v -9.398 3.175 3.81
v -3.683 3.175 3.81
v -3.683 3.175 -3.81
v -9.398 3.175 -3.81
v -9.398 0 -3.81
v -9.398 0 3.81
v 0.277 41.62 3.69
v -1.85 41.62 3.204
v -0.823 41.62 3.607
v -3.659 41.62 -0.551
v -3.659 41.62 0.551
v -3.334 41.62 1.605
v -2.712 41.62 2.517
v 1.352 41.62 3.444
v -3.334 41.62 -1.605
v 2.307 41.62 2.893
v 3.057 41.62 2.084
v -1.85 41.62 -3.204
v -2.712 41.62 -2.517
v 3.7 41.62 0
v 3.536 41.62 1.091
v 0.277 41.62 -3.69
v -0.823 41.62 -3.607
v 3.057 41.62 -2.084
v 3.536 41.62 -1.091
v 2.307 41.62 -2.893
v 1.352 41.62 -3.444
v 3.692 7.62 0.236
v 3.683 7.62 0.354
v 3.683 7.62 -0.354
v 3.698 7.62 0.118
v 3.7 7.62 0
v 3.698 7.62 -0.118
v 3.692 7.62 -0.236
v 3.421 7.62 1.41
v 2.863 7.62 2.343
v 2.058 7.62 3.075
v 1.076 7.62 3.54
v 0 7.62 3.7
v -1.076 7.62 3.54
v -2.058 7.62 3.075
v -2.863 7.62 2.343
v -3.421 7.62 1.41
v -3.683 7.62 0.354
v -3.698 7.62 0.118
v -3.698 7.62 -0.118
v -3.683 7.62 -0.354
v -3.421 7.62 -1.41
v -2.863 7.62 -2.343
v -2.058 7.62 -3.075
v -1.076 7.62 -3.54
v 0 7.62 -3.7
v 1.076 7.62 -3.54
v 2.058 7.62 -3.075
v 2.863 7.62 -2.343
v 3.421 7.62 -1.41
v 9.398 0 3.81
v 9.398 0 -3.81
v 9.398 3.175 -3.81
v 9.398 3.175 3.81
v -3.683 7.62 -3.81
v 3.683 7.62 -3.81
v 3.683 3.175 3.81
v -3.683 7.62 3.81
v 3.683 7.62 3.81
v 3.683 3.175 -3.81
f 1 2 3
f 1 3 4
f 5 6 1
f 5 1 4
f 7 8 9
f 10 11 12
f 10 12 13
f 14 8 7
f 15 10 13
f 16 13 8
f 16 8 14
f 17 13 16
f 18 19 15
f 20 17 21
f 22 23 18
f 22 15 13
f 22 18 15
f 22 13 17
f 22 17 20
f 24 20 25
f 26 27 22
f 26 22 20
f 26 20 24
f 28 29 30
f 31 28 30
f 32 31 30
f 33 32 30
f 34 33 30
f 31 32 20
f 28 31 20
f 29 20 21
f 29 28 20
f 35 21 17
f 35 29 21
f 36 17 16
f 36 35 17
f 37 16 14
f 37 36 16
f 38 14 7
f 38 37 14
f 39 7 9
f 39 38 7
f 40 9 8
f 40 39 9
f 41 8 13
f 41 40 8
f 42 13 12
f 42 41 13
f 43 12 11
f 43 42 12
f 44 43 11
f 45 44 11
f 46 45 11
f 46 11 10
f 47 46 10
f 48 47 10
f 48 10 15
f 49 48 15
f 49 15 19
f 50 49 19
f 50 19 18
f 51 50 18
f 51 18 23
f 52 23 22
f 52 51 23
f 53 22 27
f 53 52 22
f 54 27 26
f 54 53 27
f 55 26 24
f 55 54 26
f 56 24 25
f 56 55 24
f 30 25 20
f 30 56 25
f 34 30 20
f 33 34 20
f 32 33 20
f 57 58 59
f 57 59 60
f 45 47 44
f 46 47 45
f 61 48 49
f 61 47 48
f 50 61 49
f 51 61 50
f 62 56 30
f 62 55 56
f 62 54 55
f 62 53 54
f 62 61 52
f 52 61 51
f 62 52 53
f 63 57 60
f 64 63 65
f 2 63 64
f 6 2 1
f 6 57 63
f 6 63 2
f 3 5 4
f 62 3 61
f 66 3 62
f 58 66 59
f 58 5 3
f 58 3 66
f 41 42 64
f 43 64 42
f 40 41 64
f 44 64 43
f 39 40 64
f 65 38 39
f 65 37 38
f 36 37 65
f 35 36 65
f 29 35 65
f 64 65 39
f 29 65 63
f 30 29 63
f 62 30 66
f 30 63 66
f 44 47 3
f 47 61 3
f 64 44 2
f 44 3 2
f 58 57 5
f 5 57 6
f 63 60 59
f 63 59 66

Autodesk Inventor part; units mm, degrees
ref_plane "YZ Plane" through (0, 0, 0) normal (1, 0, 0) x (0, 1, 0)
ref_plane "XZ Plane" through (0, 0, 0) normal (0, 1, 0) x (-1, 0, 0)
ref_plane "XY Plane" through (0, 0, 0) normal (0, 0, 1) x (1, 0, 0)
sketch "Sketch1" plane through (0, 0, 0) normal (0, 1, 0) x (-1, 0, 0)
  line L0 (-9.398, 3.81) -> (9.398, 3.81)
  line L1 (9.398, 3.81) -> (9.398, -3.81)
  line L2 (9.398, -3.81) -> (-9.398, -3.81)
  line L3 (-9.398, -3.81) -> (-9.398, 3.81)
  line L4 (-9.398, 3.81) -> (9.398, -3.81) construction
  line L5 (9.398, 3.81) -> (-9.398, -3.81) construction
  point P0 (0, 0)
  dimension "d0" = 18.796
  dimension "d1" = 7.62
extrude "Extrusion1" add sketch "Sketch1" along normal blind 3.175
sketch "Sketch2" plane through (0, 3.175, 0) normal (0, 1, 0) x (1, 0, 0)
  line L0 (-9.398, -3.81) -> (9.398, -3.81) projected
  line L1 (3.683, 3.81) -> (-3.683, 3.81)
  line L2 (-3.683, 3.81) -> (-3.683, -3.81)
  line L3 (-3.683, -3.81) -> (3.683, -3.81)
  line L4 (3.683, -3.81) -> (3.683, 3.81)
  line L5 (3.683, 3.81) -> (-3.683, -3.81) construction
  line L6 (-3.683, 3.81) -> (3.683, -3.81) construction
  point P0 (0, 0)
  dimension "d4" = 7.366
extrude "Extrusion2" add sketch "Sketch2" along normal blind 4.445
sketch "Sketch3" plane through (0, 7.62, 0) normal (0, 1, 0) x (1, 0, 0)
  circle A0 centre (0, 0) radius 3.7
  dimension "d7" = 7.4
extrude "Extrusion3" add sketch "Sketch3" along normal blind 34
properties part number "Press_Mandrel"
